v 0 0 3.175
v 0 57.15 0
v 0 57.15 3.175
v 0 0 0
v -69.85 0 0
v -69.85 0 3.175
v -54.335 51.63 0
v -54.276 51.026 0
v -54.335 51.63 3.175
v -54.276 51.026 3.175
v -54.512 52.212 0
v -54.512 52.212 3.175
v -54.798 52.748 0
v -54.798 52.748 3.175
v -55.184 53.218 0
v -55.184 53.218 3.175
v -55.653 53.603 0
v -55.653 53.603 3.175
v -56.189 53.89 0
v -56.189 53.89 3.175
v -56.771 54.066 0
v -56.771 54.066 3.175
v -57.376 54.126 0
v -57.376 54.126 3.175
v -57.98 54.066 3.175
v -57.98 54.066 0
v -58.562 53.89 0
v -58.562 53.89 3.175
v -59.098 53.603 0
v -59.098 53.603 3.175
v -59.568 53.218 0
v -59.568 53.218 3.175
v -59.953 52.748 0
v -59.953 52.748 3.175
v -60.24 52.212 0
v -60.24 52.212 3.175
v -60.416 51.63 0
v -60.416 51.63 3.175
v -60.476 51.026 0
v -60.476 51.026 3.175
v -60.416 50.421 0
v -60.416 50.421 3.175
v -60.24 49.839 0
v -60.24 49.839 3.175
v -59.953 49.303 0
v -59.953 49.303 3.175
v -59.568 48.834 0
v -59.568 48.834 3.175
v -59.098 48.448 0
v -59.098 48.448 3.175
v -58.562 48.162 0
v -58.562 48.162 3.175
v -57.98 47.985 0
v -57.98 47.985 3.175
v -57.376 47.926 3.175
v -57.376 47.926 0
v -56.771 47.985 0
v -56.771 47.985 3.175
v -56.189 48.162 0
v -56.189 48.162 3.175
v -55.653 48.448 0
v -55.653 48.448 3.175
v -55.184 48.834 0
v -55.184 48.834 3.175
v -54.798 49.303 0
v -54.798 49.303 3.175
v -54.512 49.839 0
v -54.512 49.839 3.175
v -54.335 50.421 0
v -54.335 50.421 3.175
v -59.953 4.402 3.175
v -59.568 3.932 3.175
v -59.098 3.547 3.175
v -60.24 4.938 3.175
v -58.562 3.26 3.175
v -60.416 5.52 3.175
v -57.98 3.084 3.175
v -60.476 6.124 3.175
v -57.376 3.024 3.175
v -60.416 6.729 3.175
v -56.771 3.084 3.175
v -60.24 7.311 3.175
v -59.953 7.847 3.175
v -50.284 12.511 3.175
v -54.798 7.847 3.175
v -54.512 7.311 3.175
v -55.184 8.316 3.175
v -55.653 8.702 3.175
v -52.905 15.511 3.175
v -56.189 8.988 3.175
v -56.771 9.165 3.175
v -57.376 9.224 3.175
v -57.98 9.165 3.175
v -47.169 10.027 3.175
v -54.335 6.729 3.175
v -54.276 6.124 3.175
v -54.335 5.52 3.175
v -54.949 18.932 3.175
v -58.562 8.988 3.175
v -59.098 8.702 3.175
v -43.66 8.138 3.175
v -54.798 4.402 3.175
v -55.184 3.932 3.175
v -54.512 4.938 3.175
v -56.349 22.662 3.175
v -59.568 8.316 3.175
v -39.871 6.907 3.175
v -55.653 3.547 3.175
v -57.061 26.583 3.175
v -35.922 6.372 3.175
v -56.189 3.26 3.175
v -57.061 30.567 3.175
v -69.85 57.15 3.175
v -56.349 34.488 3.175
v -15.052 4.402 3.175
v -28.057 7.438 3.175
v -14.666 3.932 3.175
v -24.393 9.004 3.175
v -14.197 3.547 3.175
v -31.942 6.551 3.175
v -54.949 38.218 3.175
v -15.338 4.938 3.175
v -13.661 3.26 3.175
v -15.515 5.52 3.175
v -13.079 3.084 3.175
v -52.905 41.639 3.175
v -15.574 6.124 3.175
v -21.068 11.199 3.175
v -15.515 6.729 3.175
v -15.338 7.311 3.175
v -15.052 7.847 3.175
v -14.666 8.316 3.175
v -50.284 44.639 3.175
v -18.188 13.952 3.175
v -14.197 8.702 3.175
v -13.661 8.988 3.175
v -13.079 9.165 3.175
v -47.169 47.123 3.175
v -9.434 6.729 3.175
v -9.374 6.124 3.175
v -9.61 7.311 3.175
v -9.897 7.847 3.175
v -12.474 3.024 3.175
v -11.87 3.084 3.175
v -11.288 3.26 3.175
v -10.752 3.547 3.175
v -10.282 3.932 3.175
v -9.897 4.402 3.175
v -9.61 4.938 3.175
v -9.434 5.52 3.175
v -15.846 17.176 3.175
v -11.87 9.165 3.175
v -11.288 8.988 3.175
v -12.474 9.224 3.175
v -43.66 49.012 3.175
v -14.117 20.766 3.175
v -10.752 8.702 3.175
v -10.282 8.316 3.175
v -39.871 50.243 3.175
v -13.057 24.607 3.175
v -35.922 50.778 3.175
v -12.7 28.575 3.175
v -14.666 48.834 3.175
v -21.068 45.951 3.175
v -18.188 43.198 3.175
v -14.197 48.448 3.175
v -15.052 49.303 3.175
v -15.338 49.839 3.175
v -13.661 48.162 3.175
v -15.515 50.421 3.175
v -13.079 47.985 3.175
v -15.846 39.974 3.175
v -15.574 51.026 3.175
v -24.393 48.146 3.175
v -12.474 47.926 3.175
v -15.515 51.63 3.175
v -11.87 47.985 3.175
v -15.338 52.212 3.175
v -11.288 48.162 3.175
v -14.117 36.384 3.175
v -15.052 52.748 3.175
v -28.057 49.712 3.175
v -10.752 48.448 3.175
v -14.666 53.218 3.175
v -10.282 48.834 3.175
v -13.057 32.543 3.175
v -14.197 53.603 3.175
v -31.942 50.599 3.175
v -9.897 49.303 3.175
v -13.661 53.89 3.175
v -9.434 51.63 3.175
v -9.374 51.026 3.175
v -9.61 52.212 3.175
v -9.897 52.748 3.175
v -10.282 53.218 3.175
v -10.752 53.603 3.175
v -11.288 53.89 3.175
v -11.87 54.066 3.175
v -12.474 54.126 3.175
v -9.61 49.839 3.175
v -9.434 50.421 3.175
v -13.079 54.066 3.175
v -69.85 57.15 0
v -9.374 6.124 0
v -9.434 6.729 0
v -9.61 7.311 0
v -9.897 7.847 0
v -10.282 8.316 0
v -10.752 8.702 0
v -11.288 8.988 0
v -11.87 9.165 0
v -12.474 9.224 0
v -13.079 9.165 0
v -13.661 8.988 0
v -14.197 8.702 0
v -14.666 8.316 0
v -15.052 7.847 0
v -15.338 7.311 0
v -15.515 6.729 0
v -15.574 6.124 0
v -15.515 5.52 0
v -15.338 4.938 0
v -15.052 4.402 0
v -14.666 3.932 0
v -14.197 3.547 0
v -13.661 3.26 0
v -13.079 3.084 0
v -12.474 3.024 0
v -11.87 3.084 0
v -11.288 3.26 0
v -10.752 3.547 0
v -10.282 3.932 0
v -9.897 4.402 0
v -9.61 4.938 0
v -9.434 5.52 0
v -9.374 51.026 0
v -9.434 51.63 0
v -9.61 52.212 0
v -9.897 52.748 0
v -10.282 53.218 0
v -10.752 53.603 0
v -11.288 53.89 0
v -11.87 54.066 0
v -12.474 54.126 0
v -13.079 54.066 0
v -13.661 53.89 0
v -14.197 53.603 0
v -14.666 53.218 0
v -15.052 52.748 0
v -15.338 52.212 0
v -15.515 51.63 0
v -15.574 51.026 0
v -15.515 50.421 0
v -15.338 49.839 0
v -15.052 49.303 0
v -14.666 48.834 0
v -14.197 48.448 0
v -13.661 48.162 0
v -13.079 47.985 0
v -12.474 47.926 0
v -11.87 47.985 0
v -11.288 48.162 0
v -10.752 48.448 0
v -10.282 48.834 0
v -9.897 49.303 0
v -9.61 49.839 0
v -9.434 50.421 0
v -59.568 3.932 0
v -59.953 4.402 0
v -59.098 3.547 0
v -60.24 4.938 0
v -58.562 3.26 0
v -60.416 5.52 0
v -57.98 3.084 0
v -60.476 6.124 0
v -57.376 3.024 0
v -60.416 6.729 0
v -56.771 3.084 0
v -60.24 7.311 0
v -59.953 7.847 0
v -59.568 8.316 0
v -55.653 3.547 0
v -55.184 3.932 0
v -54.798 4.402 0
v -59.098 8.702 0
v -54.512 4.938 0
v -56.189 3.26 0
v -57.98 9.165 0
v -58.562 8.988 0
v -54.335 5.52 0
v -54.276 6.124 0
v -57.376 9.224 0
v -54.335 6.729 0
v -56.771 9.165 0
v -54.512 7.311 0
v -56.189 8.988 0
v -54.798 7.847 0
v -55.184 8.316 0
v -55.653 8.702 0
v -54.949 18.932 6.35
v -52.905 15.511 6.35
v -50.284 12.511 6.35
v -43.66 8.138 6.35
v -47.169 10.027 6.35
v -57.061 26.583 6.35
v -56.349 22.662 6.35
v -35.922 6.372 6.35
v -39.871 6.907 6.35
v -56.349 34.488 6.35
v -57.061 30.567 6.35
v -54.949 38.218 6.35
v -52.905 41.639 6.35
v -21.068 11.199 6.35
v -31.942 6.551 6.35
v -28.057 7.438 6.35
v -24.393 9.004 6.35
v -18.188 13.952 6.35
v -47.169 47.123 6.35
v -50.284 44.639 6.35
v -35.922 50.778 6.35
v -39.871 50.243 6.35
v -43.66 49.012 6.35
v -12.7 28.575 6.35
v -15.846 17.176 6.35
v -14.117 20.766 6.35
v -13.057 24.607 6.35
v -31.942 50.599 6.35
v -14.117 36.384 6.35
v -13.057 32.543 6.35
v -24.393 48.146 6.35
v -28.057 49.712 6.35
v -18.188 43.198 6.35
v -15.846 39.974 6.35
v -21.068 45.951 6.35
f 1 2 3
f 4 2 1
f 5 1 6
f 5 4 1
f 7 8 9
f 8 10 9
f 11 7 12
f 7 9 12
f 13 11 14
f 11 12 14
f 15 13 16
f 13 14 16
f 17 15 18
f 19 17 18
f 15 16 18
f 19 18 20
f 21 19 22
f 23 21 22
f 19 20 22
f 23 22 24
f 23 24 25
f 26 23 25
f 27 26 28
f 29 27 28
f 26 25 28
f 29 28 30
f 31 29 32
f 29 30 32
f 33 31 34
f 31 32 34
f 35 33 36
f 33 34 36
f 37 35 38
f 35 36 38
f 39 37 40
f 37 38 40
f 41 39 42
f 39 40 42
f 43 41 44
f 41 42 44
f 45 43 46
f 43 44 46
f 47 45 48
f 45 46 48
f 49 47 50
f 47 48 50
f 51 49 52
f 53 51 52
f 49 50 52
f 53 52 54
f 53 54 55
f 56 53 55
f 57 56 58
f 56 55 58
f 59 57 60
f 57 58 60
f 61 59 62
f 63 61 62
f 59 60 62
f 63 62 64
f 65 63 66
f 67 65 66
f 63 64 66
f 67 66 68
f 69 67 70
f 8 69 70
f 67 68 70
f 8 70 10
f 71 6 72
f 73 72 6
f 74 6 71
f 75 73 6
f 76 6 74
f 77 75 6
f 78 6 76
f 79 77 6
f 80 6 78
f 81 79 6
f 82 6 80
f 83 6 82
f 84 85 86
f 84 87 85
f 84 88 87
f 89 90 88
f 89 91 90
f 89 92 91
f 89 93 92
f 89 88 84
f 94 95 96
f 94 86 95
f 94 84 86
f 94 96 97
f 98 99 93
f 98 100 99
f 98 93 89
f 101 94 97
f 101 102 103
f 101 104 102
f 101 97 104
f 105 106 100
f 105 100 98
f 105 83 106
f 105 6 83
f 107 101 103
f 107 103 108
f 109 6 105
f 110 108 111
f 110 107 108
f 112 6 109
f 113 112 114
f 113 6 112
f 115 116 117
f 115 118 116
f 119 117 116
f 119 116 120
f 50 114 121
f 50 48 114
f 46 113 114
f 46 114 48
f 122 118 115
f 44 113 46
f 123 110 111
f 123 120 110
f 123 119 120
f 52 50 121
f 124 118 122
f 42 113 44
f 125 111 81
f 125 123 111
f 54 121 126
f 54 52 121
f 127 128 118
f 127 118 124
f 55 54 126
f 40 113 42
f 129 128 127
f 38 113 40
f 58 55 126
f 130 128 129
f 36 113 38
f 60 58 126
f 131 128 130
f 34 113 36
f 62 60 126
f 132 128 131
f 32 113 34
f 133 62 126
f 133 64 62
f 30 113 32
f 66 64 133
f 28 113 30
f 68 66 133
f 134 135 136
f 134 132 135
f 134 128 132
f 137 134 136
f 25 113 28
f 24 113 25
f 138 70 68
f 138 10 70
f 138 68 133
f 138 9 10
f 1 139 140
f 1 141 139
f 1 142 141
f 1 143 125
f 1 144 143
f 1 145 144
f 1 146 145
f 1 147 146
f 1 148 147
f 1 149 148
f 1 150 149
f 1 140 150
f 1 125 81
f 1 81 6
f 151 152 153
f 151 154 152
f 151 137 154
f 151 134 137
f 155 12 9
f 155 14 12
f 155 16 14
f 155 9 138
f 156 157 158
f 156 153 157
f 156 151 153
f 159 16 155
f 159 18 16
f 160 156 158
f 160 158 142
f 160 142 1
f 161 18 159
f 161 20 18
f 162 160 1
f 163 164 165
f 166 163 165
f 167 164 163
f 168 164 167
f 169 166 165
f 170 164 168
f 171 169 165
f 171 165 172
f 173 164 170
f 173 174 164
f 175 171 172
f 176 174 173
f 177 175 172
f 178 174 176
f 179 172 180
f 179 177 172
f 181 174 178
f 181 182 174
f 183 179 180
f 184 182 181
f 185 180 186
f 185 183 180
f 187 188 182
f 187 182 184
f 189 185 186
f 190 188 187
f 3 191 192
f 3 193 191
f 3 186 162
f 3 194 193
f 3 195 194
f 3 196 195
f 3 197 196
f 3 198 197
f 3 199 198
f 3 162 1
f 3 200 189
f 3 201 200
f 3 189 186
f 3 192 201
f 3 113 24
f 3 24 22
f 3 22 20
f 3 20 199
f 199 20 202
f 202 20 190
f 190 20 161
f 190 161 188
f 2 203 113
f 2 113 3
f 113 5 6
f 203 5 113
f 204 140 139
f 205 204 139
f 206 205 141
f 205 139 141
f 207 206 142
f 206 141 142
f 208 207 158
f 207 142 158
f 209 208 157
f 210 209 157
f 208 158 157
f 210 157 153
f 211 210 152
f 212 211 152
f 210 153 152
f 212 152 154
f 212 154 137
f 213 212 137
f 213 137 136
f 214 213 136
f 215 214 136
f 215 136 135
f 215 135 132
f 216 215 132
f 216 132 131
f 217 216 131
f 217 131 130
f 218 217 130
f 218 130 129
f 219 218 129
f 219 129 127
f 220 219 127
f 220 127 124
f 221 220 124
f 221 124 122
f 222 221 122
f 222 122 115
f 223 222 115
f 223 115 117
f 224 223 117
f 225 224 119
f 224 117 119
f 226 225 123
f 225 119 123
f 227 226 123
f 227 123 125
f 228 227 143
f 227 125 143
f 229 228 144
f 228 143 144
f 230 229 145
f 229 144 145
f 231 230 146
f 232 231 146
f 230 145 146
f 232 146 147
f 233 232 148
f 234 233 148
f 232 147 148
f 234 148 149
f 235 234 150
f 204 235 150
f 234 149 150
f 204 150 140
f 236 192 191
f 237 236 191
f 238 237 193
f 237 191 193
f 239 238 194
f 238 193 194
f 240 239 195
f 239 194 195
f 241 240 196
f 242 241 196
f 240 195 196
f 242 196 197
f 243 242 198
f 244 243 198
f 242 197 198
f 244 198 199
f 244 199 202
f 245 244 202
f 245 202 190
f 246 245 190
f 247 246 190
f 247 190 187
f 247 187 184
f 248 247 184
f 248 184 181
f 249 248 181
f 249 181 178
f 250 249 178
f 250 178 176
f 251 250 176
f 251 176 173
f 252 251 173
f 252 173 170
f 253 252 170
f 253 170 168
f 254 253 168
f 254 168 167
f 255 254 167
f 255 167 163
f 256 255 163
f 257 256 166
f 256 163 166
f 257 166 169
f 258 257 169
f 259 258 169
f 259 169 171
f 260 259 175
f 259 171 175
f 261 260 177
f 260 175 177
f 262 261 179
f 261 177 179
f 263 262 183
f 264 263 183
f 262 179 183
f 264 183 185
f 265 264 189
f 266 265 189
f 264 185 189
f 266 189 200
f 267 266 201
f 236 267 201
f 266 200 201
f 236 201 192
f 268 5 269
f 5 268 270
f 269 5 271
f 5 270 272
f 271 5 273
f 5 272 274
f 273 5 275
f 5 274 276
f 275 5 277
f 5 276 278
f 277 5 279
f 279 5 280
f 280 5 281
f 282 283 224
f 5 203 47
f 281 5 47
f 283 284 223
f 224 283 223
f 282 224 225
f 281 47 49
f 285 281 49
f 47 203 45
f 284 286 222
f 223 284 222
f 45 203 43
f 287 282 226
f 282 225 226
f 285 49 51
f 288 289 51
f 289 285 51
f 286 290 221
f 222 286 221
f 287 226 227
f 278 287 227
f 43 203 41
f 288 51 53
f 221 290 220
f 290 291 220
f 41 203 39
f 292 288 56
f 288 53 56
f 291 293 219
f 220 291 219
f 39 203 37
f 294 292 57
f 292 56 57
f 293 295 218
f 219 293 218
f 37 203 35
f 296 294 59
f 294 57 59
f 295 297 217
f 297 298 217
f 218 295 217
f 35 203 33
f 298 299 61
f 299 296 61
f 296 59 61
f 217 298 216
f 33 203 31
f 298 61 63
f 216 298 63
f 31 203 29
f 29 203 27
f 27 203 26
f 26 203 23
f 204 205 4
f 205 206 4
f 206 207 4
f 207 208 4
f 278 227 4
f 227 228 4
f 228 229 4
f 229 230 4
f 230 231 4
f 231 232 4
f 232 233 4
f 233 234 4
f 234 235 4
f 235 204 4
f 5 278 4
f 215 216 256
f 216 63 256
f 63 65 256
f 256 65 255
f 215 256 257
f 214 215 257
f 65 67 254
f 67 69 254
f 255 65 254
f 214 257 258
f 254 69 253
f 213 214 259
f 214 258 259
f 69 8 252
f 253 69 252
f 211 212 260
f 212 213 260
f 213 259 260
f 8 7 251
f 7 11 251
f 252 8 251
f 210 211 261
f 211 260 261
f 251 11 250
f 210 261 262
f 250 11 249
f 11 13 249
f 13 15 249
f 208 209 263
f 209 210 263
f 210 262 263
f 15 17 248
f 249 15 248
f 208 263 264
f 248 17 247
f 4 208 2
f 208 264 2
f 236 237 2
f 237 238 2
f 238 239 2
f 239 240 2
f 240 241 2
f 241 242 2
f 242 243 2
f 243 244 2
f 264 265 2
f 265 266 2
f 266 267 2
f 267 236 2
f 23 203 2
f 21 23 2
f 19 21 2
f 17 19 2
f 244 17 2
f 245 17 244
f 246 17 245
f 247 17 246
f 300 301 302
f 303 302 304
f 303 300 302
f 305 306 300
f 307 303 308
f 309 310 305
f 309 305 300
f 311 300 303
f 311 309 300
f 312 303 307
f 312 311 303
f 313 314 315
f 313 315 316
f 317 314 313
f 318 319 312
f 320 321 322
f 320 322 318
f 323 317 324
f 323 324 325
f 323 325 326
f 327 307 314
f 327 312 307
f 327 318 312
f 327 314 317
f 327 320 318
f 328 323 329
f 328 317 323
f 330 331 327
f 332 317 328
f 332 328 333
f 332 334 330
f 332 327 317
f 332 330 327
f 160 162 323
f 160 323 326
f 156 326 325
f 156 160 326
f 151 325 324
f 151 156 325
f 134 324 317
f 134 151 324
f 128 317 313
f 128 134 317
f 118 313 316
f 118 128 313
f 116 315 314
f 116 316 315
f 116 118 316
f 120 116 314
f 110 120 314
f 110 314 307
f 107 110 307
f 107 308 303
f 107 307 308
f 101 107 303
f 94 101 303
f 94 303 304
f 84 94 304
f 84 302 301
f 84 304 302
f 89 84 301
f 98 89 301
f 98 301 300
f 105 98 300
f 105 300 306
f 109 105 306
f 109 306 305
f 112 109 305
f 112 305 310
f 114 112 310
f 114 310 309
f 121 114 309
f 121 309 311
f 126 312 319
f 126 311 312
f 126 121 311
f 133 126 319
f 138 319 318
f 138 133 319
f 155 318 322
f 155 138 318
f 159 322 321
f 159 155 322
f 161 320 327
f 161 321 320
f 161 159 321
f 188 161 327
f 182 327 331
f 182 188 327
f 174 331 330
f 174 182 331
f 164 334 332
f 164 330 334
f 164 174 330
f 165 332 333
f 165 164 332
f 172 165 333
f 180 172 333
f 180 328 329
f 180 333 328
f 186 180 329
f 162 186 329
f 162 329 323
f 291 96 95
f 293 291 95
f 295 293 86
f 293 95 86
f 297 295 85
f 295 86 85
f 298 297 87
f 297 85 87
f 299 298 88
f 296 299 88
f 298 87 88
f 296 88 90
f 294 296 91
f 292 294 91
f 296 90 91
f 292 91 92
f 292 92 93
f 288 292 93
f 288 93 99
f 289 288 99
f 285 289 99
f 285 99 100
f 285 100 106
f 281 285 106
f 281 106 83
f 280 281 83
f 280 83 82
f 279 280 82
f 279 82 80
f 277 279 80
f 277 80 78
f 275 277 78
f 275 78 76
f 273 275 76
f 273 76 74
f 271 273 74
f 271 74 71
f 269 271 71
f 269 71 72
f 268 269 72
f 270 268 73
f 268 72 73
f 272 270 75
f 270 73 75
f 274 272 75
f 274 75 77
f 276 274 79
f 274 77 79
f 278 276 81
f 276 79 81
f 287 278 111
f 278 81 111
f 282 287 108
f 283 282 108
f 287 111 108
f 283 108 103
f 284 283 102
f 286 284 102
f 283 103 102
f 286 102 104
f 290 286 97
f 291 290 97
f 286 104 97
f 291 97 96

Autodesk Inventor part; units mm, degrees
ref_plane "YZ Plane" through (0, 0, 0) normal (1, 0, 0) x (0, 1, 0)
ref_plane "XZ Plane" through (0, 0, 0) normal (0, 1, 0) x (-1, 0, 0)
ref_plane "XY Plane" through (0, 0, 0) normal (0, 0, 1) x (1, 0, 0)
sketch "Sketch1" plane through (0, 0, 0) normal (0, 0, 1) x (1, 0, 0)
  line L0 (0, 0) -> (-69.85, 0)
  line L1 (-69.85, 0) -> (-69.85, 57.15)
  line L2 (-69.85, 57.15) -> (0, 57.15)
  line L3 (0, 57.15) -> (0, 0)
  dimension "d0" = 69.85
  dimension "d1" = 57.15
extrude "Extrusion1" add sketch "Sketch1" along normal blind 3.175
sketch "Sketch2" plane through (0, 0, 3.175) normal (0, 0, 1) x (1, 0, 0)
  line L0 (-69.85, 57.15) -> (-69.85, 0) construction
  line L1 (-69.85, 0) -> (0, 0) construction
  line L2 (-69.85, 57.15) -> (0, 0) construction
  circle A0 centre (-34.925, 28.575) radius 22.225
  dimension "d4" = 44.45
extrude "Extrusion2" add sketch "Sketch2" along normal blind 3.175
sketch "Sketch3" plane through (0, 0, 3.175) normal (0, 0, 1) x (1, 0, 0)
  circle A0 centre (-34.925, 28.575) radius 22.225 construction
  circle A1 centre (-34.925, 28.575) radius 31.75 construction
  line L0 (-34.925, 28.575) -> (-12.4744, 6.1244) construction
  line L1 (-34.925, 28.575) -> (-3.175, 28.575) construction
  circle A2 centre (-12.4744, 6.1244) radius 3.1
  circle A3 centre (-12.4744, 51.0256) radius 3.1
  circle A4 centre (-57.3756, 51.0256) radius 3.1
  circle A5 centre (-57.3756, 6.1244) radius 3.1
  point P0 (0, 0)
  dimension "d7" = 63.5
  dimension "d8" = 45
  dimension "d9" = 6.2
  dimension "d12" = 360
extrude "Extrusion3" cut sketch "Sketch3" against normal blind 3.175
properties part number "endcap1" material "Aluminum 6061"
